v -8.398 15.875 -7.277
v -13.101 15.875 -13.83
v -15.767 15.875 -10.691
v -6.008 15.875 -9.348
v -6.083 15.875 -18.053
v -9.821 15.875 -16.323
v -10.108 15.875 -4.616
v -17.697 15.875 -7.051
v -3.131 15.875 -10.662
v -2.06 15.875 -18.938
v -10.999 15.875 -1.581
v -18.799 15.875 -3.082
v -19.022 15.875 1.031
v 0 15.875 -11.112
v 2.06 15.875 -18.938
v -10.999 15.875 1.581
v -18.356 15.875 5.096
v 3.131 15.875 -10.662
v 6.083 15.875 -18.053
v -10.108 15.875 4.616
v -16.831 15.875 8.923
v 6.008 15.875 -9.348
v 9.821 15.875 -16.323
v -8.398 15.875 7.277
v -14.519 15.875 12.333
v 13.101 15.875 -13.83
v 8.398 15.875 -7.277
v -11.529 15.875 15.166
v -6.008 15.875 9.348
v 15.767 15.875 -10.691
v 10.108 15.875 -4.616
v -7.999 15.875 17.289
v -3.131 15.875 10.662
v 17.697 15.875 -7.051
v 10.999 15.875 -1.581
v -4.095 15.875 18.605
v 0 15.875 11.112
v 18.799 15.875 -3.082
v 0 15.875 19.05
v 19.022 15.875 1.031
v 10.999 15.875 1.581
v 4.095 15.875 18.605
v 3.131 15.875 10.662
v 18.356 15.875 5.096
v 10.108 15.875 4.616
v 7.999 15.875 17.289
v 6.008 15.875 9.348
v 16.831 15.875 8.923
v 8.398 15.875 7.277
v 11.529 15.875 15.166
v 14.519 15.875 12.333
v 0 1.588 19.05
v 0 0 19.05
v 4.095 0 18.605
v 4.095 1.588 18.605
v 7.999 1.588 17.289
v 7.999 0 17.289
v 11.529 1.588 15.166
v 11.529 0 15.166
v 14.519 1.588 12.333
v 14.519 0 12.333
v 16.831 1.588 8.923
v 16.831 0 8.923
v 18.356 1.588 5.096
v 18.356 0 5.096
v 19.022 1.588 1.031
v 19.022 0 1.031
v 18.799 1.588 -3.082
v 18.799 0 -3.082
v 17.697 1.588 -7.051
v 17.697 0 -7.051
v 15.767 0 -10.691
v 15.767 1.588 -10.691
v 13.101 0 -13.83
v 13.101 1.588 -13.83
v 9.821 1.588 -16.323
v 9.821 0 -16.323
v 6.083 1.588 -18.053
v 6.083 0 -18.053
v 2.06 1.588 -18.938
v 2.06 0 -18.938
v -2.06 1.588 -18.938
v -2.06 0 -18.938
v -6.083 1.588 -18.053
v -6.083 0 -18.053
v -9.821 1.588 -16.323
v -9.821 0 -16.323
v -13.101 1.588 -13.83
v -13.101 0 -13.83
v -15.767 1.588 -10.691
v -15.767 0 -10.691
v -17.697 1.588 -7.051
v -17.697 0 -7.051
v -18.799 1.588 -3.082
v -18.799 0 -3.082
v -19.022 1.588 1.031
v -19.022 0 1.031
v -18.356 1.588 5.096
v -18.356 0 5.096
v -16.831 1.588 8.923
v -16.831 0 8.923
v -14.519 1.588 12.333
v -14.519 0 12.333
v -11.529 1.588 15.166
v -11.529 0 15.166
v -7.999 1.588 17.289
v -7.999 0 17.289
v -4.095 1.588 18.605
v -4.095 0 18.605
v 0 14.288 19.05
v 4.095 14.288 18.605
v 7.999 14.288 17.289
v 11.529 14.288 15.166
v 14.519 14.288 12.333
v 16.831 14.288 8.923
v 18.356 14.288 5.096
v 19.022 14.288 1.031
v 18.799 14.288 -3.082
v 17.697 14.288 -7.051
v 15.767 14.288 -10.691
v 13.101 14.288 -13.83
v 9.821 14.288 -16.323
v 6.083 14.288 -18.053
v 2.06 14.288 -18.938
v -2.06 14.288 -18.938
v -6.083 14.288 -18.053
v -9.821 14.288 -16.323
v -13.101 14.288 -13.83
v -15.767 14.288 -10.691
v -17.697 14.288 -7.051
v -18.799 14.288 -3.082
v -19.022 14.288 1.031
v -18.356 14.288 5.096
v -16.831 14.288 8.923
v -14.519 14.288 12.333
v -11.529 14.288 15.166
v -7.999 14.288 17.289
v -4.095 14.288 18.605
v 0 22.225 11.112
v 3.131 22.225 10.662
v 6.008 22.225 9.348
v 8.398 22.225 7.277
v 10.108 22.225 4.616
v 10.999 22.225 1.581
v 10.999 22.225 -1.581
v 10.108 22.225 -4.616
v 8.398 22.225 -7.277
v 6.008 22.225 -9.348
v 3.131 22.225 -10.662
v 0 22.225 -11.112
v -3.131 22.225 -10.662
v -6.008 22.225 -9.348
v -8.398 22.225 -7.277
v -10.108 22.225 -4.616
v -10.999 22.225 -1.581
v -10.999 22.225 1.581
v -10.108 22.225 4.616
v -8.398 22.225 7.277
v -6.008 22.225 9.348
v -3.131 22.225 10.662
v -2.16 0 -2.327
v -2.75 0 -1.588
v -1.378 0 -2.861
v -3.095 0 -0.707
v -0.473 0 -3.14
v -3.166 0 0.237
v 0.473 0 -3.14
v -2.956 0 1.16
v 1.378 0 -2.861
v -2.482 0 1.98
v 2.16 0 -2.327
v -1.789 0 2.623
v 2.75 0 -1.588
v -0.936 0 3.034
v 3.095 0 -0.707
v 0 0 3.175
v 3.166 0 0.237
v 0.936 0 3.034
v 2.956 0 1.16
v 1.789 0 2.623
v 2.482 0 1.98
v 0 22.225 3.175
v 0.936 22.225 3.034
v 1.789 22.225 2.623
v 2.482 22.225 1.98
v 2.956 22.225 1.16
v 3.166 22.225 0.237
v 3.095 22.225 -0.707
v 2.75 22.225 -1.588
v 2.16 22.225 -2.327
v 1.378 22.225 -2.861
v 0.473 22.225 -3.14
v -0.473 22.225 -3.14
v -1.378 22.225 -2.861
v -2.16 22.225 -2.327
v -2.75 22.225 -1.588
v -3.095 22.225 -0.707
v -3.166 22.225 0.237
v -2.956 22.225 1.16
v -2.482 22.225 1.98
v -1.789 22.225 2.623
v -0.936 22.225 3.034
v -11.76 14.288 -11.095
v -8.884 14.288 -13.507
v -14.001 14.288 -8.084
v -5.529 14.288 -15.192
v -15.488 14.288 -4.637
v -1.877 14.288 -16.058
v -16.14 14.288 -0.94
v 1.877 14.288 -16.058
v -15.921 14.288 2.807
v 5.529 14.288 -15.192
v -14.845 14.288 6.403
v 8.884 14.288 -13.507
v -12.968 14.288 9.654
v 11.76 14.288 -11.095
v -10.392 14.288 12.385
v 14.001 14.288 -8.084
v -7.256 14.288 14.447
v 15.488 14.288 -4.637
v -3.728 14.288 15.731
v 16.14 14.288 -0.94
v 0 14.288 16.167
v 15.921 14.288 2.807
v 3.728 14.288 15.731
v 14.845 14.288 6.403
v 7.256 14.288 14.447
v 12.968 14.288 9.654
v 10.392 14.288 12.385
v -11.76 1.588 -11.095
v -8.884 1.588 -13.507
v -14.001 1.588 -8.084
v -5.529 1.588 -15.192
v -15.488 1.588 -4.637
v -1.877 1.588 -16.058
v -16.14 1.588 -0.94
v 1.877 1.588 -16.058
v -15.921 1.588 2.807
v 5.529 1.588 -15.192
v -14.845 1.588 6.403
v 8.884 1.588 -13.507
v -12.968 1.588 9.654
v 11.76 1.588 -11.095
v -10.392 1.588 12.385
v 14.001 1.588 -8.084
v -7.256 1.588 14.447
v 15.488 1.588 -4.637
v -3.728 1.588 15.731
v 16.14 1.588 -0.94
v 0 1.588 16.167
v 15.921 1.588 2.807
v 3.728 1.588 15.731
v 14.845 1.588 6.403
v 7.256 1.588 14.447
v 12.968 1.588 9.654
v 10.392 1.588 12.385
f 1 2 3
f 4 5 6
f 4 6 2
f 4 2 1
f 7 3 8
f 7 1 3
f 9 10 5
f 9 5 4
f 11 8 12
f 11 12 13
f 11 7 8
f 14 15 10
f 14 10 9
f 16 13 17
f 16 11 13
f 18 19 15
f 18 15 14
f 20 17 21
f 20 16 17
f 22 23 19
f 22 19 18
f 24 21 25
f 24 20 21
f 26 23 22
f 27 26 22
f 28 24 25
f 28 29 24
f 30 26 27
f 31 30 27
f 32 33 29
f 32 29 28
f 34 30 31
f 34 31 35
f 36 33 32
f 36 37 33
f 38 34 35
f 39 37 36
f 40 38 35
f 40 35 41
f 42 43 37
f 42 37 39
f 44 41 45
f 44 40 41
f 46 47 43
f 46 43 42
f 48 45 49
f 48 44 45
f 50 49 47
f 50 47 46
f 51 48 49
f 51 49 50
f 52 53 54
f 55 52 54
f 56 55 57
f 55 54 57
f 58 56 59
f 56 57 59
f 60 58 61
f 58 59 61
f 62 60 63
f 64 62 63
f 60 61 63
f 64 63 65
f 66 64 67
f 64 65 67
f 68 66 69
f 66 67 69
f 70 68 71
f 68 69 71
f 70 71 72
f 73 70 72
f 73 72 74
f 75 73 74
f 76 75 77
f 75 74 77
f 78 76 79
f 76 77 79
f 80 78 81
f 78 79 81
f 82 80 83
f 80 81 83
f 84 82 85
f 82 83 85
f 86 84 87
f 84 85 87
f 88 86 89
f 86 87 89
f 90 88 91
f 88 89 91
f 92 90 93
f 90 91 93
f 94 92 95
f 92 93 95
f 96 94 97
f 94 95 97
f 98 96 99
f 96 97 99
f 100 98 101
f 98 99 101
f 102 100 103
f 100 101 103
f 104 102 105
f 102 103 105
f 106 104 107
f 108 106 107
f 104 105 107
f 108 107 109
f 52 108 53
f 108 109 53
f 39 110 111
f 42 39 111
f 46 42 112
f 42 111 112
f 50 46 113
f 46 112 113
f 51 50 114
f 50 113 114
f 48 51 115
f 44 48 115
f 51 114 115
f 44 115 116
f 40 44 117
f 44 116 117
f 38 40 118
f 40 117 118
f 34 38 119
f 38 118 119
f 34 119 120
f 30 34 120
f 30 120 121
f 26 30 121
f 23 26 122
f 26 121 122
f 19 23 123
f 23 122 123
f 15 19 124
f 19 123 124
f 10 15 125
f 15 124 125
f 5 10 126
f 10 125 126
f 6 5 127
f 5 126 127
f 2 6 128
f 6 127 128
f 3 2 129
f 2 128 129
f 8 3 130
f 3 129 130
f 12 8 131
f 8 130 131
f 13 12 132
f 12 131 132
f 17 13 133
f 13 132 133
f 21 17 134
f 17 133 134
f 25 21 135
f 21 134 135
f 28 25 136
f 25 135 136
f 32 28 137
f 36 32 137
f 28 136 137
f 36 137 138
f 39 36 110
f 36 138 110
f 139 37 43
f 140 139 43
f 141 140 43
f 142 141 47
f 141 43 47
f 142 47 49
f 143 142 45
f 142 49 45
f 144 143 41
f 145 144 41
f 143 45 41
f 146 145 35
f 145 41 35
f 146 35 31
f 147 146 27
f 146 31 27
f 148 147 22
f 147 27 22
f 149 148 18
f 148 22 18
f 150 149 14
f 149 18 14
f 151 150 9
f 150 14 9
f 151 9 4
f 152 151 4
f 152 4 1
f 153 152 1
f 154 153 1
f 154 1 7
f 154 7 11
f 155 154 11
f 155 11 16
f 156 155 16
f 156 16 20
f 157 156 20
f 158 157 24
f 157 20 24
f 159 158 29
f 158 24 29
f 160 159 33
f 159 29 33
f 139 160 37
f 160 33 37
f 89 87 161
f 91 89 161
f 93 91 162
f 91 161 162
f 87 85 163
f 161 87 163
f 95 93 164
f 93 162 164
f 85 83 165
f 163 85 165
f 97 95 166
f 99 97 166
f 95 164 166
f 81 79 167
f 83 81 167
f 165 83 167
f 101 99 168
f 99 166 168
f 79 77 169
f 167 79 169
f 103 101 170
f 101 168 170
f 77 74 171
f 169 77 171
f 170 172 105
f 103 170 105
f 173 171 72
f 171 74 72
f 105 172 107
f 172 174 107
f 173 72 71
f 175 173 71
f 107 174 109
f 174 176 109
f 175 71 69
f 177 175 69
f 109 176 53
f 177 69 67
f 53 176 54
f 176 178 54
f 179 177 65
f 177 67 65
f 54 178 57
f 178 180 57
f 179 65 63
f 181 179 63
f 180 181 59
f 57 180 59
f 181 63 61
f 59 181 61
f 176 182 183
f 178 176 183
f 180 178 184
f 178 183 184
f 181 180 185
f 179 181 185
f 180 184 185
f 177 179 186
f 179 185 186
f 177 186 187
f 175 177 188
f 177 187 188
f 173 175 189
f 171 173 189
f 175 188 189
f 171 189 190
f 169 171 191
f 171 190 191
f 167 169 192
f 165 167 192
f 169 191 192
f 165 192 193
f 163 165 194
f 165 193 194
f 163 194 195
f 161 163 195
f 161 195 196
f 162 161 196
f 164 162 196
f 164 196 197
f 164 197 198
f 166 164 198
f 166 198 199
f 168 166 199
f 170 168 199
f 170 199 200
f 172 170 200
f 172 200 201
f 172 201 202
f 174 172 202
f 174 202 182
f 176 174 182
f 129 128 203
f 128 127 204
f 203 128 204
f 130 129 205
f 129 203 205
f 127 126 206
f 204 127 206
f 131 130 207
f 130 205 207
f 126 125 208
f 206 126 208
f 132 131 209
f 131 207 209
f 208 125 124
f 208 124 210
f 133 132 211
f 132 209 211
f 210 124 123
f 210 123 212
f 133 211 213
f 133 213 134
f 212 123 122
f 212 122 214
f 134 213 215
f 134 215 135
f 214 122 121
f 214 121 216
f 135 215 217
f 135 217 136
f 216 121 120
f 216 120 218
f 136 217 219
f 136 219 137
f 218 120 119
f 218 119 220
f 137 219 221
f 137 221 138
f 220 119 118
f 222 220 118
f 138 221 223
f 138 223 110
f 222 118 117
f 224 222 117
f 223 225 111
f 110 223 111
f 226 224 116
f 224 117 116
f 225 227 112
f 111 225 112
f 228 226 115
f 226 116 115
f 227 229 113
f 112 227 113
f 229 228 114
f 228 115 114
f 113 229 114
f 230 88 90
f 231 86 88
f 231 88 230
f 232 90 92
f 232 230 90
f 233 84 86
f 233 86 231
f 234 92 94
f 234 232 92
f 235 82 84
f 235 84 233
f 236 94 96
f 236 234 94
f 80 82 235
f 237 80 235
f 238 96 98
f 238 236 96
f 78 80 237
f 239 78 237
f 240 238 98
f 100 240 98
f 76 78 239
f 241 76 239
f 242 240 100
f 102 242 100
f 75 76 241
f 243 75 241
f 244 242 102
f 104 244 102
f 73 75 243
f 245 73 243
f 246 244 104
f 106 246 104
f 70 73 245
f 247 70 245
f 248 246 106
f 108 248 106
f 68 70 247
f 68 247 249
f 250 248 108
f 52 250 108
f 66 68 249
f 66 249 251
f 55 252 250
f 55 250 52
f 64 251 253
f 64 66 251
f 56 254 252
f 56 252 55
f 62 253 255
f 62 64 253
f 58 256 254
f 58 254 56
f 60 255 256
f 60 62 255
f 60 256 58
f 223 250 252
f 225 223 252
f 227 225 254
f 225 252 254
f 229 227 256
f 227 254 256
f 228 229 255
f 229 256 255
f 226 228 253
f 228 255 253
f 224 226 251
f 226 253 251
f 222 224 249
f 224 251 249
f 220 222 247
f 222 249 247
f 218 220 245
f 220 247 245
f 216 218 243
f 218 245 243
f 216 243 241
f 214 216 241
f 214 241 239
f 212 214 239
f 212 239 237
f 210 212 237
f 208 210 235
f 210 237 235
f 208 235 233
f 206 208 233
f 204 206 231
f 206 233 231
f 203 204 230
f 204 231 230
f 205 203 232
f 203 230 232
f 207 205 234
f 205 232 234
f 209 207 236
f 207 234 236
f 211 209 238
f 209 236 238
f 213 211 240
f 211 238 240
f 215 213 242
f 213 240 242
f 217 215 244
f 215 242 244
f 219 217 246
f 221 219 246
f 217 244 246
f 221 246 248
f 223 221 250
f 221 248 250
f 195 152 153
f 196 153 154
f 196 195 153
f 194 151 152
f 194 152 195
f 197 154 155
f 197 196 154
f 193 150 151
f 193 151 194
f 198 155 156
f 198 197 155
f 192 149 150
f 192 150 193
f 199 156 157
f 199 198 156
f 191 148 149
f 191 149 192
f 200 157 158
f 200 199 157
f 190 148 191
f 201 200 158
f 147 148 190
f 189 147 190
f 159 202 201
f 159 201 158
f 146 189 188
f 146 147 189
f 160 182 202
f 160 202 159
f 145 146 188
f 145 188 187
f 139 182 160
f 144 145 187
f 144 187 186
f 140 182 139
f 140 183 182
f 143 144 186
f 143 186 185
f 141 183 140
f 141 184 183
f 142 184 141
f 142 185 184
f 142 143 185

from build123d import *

# Parameters (mm, degrees)
SKETCH1_R           = 19.05
BOSS_EXTRUDE1_DEPTH = 1.5875
SKETCH2_R           = 16.1671
BOSS_EXTRUDE2_DEPTH = 12.7
SKETCH3_R           = 19.05
BOSS_EXTRUDE3_DEPTH = 1.5875
SKETCH4_R           = 11.1125
BOSS_EXTRUDE4_DEPTH = 6.35
CUT_EXTRUDE1_REACH  = 36.925
SKETCH5_R           = 3.175


with BuildPart() as part:
    # Sketch1 → Boss-Extrude1 (new body)
    with BuildSketch(Plane(origin=(0, 0, 0), x_dir=(1, 0, 0), z_dir=(0, 1, 0))):
        with Locations(Location((0, 0, 0), (0, 0, 270))):
            Circle(SKETCH1_R)
    extrude(amount=BOSS_EXTRUDE1_DEPTH)

    # Sketch2 → Boss-Extrude2 (add)
    with BuildSketch(Plane(origin=(0, 1.5875, 0), x_dir=(1, 0, 0), z_dir=(0, 1, 0))):
        with Locations(Location((0, 0, 0), (0, 0, 270))):
            Circle(SKETCH2_R)
    extrude(amount=BOSS_EXTRUDE2_DEPTH)

    # Sketch3 → Boss-Extrude3 (add)
    with BuildSketch(Plane(origin=(0, 14.2875, 0), x_dir=(1, 0, 0), z_dir=(0, 1, 0))):
        with Locations(Location((0, 0, 0), (0, 0, 270))):
            Circle(SKETCH3_R)
    extrude(amount=BOSS_EXTRUDE3_DEPTH)

    # Sketch4 → Boss-Extrude4 (add)
    with BuildSketch(Plane(origin=(0, 15.875, 0), x_dir=(1, 0, 0), z_dir=(0, 1, 0))):
        with Locations(Location((0, 0, 0), (0, 0, 270))):
            Circle(SKETCH4_R)
    extrude(amount=BOSS_EXTRUDE4_DEPTH)

    # Sketch5 → Cut-Extrude1 (cut, up to next)
    with BuildSketch(Plane(origin=(0, 22.225, 0), x_dir=(1, 0, 0), z_dir=(0, 1, 0)), mode=Mode.PRIVATE) as cut_extrude1_sk1:
        with Locations(Location((0, 0, 0), (0, 0, 270))):
            Circle(SKETCH5_R)
    cut_extrude1_tool1 = extrude(cut_extrude1_sk1.sketch, amount=-CUT_EXTRUDE1_REACH, mode=Mode.PRIVATE) & part.part
    add(cut_extrude1_tool1.solids().sort_by_distance((0, 22.225, 0))[0], mode=Mode.SUBTRACT)


solid = part.part
